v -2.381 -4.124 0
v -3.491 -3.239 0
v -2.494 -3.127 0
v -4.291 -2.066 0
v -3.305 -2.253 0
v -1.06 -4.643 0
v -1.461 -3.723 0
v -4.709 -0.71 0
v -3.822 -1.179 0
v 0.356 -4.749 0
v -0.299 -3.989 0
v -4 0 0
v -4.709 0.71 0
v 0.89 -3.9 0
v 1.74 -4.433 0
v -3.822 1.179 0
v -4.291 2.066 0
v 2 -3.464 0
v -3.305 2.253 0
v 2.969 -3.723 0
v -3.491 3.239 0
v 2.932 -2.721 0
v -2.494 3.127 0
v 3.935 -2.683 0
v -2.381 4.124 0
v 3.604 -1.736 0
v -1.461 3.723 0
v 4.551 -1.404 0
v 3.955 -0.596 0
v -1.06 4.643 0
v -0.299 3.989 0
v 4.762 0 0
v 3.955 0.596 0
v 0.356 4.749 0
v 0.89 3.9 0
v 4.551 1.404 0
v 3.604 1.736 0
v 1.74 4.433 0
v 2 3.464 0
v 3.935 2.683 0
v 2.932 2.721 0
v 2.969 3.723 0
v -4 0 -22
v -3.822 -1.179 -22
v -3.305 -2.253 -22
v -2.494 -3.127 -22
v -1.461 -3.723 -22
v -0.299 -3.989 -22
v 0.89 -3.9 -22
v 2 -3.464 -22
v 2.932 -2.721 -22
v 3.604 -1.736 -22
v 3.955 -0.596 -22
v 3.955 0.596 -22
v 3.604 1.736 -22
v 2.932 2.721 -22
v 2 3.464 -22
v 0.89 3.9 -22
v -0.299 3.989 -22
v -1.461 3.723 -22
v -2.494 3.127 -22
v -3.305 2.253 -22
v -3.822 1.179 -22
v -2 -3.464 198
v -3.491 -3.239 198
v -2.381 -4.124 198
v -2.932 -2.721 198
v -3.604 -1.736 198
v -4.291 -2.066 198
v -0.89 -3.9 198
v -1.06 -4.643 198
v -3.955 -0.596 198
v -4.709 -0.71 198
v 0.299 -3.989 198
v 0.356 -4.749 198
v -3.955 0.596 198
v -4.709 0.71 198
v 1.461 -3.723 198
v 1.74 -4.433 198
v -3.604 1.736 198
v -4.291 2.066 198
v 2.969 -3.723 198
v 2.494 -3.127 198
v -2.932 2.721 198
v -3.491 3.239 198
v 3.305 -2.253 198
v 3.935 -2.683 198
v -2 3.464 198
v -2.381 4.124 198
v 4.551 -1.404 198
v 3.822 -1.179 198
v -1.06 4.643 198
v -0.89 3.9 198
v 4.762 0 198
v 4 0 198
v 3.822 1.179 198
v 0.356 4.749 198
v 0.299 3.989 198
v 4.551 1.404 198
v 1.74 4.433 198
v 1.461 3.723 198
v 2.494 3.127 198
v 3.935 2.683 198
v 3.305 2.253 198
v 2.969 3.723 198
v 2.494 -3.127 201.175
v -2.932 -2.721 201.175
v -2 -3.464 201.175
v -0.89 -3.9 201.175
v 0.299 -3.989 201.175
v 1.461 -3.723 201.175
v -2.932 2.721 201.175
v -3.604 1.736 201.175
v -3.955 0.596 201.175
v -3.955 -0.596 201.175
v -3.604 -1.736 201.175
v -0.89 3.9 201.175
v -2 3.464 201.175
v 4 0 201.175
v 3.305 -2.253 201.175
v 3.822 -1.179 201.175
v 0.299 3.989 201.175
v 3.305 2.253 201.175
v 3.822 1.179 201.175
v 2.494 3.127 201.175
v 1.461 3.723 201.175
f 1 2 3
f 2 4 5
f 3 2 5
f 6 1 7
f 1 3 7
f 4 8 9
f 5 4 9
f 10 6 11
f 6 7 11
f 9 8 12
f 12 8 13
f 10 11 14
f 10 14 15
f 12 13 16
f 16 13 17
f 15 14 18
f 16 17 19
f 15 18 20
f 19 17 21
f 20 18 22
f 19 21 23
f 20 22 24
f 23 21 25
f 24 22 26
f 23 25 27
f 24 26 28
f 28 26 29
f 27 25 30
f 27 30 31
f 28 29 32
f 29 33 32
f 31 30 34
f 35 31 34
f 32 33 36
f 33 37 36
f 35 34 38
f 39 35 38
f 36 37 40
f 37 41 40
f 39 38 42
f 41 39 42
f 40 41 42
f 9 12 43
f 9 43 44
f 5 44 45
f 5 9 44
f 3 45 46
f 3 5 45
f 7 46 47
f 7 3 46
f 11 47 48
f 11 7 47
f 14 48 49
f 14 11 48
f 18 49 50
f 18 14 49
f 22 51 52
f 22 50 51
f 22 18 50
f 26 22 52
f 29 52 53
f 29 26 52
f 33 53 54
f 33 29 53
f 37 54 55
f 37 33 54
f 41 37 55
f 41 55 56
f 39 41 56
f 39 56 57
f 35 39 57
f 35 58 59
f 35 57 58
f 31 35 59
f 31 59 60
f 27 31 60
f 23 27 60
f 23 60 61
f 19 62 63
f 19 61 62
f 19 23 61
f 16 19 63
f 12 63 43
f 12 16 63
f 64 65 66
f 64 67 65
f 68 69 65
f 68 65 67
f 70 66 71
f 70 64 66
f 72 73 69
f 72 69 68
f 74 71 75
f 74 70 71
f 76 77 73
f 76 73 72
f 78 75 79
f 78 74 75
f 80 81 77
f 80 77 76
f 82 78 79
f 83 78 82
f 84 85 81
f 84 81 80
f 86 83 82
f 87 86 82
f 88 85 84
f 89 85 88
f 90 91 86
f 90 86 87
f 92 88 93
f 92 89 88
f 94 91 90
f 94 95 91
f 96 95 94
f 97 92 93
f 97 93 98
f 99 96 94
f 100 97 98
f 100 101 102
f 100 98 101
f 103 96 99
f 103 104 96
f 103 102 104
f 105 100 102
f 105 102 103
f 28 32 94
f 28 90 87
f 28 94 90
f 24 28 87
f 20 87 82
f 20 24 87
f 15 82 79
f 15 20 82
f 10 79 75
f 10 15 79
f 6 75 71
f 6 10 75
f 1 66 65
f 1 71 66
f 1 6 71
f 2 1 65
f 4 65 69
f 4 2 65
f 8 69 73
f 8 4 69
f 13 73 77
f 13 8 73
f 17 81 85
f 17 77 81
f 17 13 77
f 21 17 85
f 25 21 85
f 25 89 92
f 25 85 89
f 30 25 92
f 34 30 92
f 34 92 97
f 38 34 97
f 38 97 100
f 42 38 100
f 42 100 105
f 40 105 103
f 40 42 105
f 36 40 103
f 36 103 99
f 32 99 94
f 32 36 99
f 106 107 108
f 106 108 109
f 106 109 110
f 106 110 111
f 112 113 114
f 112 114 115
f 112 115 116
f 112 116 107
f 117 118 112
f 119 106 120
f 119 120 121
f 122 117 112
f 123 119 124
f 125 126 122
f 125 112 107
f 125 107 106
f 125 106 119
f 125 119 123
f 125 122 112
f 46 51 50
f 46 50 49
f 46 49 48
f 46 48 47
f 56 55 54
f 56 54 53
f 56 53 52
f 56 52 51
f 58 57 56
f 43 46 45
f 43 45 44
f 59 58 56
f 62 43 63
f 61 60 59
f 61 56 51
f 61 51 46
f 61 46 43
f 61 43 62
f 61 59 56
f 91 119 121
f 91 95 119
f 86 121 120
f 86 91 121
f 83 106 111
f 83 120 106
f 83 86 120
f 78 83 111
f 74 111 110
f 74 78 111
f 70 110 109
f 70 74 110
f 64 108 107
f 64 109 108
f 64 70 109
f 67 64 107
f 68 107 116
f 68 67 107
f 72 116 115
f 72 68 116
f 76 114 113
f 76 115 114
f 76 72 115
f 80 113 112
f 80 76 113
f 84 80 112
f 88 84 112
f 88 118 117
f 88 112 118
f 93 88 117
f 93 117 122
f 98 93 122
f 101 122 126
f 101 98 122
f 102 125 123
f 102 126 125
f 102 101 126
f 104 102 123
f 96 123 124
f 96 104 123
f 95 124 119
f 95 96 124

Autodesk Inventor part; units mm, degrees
ref_plane "YZ Plane" through (0, 0, 0) normal (1, 0, 0) x (0, 1, 0)
ref_plane "XZ Plane" through (0, 0, 0) normal (0, 1, 0) x (-1, 0, 0)
ref_plane "XY Plane" through (0, 0, 0) normal (0, 0, 1) x (1, 0, 0)
sketch "Sketch1" plane through (0, 0, 0) normal (0, 0, 1) x (1, 0, 0)
  circle A0 centre (0, 0) radius 4.7625
  dimension "d0" = 9.525
extrude "Extrusion1" add sketch "Sketch1" along normal blind 198
sketch "Sketch2" plane through (0, 0, 198) normal (0, 0, 1) x (1, 0, 0)
  circle A0 centre (0, 0) radius 4.7625 projected
  circle A1 centre (0, 0) radius 4
  dimension "d4" = 8
extrude "Extrusion2" add sketch "Sketch2" along normal blind 3.175 contours A1
sketch "Sketch3" plane through (0, 0, 0) normal (0, 0, -1) x (-1, 0, 0)
  circle A0 centre (0, 0) radius 4.7625 projected
  circle A1 centre (0, 0) radius 4
  dimension "d7" = 8
extrude "Extrusion3" add sketch "Sketch3" along normal blind 22 contours A1
thread "Thread1" size "3/8-16 UNC" class "2A" standard "ANSI Unified Screw Threads" full length
properties part number "S2_zrod"
